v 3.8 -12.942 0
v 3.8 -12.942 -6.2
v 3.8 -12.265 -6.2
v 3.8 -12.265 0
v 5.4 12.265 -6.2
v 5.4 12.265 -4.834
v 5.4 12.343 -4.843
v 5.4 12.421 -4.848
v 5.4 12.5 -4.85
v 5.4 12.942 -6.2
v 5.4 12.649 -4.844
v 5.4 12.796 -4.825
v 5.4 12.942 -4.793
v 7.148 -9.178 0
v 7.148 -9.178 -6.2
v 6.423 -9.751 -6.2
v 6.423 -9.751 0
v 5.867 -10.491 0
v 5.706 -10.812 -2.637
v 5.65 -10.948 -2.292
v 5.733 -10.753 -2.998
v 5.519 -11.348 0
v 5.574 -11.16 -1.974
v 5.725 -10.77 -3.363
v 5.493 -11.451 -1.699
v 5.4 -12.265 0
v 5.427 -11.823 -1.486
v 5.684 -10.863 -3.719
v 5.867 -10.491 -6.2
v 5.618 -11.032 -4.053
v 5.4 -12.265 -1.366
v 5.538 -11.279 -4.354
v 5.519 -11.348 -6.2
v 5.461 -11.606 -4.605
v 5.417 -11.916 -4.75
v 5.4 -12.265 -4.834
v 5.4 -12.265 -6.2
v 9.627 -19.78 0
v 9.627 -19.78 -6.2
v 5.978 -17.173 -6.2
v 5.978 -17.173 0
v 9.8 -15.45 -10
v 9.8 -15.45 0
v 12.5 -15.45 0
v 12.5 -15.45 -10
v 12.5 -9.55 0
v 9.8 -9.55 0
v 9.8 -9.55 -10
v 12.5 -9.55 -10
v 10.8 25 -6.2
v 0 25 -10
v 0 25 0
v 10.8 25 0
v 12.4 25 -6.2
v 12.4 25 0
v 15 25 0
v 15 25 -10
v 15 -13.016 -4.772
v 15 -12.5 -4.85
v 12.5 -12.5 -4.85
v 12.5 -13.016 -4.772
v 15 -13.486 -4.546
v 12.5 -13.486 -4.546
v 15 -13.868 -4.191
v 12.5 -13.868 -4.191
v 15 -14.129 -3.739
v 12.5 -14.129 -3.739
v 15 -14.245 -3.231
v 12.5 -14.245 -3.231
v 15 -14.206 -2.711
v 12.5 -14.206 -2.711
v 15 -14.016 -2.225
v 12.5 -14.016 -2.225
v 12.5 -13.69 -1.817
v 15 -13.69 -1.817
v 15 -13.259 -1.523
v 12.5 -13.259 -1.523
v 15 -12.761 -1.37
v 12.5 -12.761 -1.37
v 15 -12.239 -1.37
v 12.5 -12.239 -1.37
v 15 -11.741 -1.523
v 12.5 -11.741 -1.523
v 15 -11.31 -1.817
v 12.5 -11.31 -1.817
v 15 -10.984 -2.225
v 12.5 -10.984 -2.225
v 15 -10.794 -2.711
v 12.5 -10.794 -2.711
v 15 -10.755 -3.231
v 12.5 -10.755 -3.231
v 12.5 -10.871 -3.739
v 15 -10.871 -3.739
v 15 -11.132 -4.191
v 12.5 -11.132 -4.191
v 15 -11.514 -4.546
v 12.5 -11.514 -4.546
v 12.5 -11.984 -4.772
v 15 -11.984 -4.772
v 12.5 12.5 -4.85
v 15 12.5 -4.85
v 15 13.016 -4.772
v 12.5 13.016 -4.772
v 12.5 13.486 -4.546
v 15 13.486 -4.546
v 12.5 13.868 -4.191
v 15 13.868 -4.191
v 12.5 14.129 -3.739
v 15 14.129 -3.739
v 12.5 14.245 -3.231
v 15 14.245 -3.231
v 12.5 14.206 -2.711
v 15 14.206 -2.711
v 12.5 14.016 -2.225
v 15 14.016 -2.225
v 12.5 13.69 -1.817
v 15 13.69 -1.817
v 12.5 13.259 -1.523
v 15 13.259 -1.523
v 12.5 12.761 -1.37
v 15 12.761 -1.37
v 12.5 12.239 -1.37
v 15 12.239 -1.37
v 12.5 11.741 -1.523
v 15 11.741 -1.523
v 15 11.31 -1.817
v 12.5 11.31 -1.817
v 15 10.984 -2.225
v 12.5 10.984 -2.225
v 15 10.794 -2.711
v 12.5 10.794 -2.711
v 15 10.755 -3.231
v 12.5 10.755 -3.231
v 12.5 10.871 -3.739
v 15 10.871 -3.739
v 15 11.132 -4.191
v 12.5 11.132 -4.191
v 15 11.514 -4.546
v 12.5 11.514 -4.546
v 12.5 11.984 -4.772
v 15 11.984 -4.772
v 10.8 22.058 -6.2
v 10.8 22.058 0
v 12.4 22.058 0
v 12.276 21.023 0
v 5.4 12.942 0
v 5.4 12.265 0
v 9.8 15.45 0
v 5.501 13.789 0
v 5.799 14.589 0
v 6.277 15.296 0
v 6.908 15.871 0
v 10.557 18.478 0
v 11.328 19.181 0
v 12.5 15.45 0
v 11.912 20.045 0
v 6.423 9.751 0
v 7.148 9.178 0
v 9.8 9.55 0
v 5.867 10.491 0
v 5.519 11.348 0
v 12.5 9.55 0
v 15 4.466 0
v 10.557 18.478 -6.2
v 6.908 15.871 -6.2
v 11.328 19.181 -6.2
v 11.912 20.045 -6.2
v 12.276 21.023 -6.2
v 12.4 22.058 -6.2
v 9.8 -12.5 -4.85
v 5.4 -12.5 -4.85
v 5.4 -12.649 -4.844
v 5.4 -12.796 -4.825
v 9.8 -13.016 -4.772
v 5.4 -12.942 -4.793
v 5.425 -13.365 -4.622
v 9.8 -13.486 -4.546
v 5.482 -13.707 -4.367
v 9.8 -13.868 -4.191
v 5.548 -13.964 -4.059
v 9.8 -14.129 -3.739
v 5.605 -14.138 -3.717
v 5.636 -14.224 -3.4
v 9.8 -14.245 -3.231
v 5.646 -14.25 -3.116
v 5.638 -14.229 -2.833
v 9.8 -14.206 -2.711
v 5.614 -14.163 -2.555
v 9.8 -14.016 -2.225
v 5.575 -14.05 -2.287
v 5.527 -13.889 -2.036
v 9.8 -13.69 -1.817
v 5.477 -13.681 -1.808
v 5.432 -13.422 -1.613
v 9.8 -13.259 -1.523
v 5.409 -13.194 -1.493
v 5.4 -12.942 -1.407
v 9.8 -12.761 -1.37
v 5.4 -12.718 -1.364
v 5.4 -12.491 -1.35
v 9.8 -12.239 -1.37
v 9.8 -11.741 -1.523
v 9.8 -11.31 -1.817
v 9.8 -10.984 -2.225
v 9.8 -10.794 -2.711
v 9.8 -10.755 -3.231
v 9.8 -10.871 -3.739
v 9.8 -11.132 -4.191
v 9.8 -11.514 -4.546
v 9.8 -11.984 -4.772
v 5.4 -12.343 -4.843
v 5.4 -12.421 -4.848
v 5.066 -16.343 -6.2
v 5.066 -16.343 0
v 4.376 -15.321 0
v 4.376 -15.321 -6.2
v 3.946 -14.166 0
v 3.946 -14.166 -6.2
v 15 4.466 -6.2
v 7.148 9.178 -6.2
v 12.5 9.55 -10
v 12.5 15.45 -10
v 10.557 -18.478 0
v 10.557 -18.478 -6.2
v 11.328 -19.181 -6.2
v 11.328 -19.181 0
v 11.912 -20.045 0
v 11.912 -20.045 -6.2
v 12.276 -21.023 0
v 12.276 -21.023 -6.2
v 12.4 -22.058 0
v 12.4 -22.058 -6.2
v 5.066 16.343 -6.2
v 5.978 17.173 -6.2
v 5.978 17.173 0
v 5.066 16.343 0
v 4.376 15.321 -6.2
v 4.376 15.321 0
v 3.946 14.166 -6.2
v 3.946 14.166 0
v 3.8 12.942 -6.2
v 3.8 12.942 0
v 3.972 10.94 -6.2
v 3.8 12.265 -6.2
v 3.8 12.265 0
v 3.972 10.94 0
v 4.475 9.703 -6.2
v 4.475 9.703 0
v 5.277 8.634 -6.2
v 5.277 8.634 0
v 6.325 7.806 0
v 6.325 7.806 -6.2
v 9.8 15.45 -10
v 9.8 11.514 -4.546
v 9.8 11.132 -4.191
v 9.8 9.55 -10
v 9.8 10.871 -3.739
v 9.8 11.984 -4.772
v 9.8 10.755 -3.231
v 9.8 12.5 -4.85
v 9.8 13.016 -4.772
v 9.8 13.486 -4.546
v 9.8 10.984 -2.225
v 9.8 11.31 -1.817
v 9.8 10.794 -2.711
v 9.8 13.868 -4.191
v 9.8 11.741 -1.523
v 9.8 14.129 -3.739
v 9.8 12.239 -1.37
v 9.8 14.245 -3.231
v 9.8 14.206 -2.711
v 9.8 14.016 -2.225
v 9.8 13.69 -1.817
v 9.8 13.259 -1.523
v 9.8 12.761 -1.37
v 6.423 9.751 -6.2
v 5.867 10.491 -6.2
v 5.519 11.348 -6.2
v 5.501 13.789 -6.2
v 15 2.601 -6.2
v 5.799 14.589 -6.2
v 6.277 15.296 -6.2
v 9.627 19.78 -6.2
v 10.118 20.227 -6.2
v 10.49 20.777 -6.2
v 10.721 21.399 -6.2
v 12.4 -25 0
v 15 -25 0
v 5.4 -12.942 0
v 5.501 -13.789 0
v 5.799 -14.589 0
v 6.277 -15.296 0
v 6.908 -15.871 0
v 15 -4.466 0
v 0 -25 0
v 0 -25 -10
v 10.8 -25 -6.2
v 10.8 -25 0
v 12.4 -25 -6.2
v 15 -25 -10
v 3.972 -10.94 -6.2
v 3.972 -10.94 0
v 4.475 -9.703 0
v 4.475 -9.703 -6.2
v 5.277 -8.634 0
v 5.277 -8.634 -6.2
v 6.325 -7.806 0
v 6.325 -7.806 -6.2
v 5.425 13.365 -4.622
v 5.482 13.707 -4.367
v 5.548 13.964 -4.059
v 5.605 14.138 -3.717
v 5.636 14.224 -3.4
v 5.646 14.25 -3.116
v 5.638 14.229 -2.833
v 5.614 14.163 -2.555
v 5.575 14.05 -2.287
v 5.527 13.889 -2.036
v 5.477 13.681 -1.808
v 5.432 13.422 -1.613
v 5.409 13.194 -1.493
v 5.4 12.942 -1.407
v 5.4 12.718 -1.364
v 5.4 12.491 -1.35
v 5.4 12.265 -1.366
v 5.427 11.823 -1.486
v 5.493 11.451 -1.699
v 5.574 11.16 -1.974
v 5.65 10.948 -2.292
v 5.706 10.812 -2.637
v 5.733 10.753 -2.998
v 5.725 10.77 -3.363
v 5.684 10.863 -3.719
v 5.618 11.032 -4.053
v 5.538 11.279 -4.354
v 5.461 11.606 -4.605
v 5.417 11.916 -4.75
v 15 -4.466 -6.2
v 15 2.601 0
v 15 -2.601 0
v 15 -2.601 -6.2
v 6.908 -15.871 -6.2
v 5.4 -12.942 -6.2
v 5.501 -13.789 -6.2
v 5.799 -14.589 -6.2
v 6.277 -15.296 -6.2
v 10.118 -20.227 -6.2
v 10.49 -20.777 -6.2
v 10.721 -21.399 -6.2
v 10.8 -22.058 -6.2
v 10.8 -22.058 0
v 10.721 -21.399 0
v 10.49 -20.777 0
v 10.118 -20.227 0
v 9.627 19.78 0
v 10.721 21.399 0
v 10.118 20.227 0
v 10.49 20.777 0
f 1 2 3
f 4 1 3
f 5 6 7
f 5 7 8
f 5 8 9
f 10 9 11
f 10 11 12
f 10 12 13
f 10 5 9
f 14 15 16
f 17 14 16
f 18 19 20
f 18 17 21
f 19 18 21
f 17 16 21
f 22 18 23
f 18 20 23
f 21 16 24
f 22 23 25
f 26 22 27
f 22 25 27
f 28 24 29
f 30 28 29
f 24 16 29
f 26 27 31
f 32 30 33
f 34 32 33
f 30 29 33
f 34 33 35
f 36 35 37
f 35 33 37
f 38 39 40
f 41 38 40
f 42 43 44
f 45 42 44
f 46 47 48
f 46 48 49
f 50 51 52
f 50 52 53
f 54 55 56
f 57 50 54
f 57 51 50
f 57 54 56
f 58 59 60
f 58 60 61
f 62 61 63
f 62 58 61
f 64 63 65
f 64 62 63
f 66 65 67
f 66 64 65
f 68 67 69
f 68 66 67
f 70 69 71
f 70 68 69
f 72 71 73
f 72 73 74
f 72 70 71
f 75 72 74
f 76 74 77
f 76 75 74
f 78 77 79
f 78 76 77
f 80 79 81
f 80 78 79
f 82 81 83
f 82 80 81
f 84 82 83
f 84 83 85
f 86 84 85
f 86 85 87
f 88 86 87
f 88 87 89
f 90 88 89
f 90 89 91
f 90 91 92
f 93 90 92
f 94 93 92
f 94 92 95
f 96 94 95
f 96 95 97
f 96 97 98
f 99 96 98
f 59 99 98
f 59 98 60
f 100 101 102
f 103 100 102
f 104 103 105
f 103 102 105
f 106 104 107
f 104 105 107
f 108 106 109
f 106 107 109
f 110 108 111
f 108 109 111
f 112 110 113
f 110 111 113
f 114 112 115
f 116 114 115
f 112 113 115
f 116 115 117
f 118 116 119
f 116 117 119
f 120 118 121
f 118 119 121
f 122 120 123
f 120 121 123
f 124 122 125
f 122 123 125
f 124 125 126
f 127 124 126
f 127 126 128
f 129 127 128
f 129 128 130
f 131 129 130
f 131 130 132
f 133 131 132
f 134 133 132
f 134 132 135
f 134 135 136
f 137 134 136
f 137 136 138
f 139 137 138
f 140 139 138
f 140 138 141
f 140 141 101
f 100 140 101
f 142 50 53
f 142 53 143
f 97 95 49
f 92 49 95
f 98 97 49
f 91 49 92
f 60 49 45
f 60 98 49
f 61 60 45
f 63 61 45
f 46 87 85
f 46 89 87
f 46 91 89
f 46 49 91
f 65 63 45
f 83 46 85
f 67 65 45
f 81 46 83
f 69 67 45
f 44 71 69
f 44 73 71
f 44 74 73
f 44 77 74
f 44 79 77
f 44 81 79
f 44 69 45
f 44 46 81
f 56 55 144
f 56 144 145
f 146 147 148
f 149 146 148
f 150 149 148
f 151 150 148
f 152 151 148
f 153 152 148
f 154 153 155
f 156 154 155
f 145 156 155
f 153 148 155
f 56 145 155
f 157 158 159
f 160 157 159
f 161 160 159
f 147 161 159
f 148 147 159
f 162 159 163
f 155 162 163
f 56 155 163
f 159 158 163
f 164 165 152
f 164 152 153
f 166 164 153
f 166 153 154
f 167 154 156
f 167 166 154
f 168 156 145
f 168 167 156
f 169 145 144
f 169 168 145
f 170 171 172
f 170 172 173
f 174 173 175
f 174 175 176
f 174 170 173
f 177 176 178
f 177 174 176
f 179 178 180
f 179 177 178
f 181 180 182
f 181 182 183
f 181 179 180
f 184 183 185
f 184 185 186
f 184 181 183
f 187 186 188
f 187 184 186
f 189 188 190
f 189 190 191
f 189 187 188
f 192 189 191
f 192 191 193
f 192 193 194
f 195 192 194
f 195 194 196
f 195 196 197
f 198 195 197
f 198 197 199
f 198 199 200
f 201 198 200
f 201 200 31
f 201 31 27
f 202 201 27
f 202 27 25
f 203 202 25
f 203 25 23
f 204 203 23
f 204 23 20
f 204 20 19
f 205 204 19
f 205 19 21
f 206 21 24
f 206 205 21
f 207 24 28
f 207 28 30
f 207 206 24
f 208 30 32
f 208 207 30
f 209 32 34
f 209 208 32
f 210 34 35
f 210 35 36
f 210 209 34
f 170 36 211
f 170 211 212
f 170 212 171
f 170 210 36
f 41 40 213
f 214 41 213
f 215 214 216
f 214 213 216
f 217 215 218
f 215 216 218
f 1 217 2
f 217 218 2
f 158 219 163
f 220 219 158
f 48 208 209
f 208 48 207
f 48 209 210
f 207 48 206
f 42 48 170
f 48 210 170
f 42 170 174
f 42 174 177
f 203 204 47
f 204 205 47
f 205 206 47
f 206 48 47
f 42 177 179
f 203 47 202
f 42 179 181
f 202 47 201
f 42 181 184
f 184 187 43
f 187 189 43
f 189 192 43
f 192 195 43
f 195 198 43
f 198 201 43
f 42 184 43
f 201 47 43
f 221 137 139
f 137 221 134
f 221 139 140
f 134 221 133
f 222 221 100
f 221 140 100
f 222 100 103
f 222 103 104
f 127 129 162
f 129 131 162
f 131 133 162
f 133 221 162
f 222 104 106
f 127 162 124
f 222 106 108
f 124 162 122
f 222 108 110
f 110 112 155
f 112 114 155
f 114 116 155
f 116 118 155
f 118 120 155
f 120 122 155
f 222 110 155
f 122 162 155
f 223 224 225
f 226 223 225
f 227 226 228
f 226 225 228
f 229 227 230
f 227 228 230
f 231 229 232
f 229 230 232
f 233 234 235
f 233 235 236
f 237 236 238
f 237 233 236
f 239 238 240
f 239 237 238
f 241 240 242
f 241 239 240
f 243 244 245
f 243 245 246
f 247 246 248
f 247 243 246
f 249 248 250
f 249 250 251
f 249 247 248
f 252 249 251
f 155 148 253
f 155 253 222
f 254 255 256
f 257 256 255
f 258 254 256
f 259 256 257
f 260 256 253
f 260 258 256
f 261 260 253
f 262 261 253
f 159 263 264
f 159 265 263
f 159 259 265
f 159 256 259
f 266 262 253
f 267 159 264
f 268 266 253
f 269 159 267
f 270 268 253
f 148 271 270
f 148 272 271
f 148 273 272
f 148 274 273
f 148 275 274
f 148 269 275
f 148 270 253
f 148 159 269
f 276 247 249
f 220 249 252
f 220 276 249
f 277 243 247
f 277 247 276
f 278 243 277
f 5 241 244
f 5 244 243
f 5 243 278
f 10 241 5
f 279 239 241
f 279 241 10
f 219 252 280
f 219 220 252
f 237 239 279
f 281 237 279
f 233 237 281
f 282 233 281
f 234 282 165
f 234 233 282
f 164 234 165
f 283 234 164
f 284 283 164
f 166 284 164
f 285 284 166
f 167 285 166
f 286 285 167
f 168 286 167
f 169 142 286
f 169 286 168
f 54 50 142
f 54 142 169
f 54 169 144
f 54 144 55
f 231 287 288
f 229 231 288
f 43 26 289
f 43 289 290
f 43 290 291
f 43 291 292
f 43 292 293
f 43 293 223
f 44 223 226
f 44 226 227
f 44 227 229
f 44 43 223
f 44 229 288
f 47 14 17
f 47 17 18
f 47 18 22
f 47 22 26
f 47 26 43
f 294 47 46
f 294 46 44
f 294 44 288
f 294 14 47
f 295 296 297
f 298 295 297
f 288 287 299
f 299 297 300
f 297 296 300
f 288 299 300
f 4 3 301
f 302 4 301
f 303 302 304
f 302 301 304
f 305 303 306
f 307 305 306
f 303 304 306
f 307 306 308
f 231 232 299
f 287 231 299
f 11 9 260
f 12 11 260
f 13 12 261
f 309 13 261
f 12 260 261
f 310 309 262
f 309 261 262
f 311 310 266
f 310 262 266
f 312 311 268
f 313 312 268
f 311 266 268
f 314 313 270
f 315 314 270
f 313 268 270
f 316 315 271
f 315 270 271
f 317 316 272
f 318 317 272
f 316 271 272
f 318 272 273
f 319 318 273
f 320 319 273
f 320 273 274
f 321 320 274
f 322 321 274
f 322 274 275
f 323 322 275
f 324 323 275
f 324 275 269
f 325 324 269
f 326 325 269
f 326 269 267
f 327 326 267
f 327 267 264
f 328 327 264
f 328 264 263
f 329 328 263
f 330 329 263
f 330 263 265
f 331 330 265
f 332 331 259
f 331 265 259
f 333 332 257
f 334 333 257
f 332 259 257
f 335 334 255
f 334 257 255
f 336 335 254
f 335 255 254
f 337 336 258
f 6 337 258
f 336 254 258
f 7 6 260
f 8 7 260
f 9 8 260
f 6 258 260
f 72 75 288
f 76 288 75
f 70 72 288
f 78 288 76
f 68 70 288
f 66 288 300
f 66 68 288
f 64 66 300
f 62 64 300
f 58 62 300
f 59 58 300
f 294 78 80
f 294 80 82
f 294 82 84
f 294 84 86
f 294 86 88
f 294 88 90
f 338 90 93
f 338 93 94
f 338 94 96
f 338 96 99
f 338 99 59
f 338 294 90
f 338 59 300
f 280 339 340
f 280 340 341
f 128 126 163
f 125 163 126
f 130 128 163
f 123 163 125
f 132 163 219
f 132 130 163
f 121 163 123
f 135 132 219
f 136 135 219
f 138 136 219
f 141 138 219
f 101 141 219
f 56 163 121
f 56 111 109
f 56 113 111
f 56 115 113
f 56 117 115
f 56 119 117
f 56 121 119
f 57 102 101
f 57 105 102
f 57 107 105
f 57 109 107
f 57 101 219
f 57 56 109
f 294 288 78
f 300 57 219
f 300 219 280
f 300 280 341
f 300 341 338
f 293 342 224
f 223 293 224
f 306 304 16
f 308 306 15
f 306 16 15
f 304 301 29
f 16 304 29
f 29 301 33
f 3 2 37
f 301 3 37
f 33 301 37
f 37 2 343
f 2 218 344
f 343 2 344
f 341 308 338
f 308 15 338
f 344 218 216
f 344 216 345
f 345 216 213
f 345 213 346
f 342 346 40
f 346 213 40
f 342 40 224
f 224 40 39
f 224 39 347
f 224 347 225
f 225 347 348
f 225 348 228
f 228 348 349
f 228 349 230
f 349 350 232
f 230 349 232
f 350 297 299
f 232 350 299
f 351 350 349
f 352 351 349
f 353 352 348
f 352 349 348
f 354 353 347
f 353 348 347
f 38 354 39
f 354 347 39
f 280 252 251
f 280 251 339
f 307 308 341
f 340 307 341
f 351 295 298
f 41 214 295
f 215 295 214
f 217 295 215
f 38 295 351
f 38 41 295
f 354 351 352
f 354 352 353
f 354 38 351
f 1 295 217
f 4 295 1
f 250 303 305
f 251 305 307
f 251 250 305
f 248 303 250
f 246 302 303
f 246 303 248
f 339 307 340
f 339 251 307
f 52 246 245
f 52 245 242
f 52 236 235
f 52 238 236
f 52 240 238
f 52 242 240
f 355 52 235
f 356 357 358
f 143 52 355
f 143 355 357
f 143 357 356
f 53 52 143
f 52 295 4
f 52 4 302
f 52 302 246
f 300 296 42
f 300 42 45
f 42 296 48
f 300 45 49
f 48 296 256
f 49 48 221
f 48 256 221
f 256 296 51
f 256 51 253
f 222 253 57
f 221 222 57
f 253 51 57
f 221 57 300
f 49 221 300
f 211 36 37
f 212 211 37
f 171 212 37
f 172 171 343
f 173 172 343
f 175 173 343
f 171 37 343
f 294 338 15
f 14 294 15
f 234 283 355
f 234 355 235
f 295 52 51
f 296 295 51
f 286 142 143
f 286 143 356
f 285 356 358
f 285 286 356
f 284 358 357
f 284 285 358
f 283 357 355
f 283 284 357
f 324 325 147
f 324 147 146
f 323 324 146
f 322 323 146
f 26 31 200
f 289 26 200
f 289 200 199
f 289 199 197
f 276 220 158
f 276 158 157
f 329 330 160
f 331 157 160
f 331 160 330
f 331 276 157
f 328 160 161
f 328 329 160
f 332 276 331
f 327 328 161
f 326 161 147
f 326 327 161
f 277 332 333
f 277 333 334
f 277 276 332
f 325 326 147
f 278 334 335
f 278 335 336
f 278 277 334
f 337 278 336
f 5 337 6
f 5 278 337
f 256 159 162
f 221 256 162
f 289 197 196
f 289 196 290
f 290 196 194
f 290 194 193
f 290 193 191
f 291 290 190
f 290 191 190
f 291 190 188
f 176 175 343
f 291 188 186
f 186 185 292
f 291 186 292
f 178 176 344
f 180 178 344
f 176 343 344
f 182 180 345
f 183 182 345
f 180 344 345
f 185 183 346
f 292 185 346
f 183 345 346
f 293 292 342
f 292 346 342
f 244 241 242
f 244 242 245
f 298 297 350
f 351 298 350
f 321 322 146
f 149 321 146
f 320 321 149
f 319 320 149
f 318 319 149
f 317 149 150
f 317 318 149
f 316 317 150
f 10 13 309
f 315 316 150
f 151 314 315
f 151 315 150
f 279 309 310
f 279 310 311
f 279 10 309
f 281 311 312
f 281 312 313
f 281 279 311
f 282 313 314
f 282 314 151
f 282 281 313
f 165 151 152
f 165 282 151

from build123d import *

# Parameters (mm, degrees)
ESQUISSE1_W                           = 15
ESQUISSE1_H                           = 10
BOSS_EXTRU_1_DEPTH                    = 25
ENL_VEMENT_START                      = -6.2
ENL_VEMENT_DE_MATI_RE_BALAYAGE1_DEPTH = 6.2
ENL_V_MAT_EXTRU_1_REACH               = 32.822
ESQUISSE4_R                           = 1.75
ENL_V_MAT_EXTRU_2_REACH               = 32.822
ESQUISSE5_W                           = 2.7
ESQUISSE5_H                           = 5.9


# Read off the part's stored shape, not the designer's step: Enlèvement de matière-Balayage1
with BuildPart() as part:
    # Esquisse1 → Boss.-Extru.1 (new body)
    with BuildSketch(Plane(origin=(0, 0, 0), x_dir=(1, 0, 0), z_dir=(0, 1, 0))):
        with Locations((7.5, 5)):
            Rectangle(ESQUISSE1_W, ESQUISSE1_H)
    extrude(amount=BOSS_EXTRU_1_DEPTH)

    # Enlèvement de matière-Balayage1 outline → Enlèvement de matière-Balayage1 (cut)
    with BuildSketch(Plane.XY.offset(ENL_VEMENT_START)):
        with BuildLine():
            Line((10.8, 25), (10.8, 22.058471581))
            ThreePointArc((10.8, 22.058471581), (10.4896694, 20.777243155), (9.627466942, 19.780017862))
            Line((9.627466942, 19.780017862), (5.977561393, 17.172942469))
            ThreePointArc((5.977561393, 17.172942469), (4.376328258, 15.320952639), (3.8, 12.941528419))
            Line((3.8, 12.941528419), (3.8, 12.264761516))
            ThreePointArc((3.8, 12.264761516), (4.474960485, 9.702727678), (6.324622072, 7.805798302))
            Line((6.324622072, 7.805798302), (15, 2.600571545))
            Line((15, 2.600571545), (15, 4.466476152))
            Line((15, 4.466476152), (7.14781528, 9.177786983))
            ThreePointArc((7.14781528, 9.177786983), (5.867280336, 10.491045782), (5.4, 12.264761516))
            Line((5.4, 12.264761516), (5.4, 12.941528419))
            ThreePointArc((5.4, 12.941528419), (5.798996486, 14.58882211), (6.907542503, 15.870968915))
            Line((6.907542503, 15.870968915), (10.557448052, 18.478044308))
            ThreePointArc((10.557448052, 18.478044308), (11.912337628, 20.045112625), (12.4, 22.058471581))
            Line((12.4, 22.058471581), (12.4, 25))
            Line((12.4, 25), (10.8, 25))
        make_face()
    extrude(amount=ENL_VEMENT_DE_MATI_RE_BALAYAGE1_DEPTH, mode=Mode.SUBTRACT)

    # Esquisse4 → Enlèv. mat.-Extru.1 (cut, up to next)
    with BuildSketch(Plane(origin=(15, 0, 0), x_dir=(0, 0, -1), z_dir=(1, 0, 0)), mode=Mode.PRIVATE) as enl_v_mat_extru_1_sk1:
        with Locations((3.1, 12.5)):
            Circle(ESQUISSE4_R)
    enl_v_mat_extru_1_tool1 = extrude(enl_v_mat_extru_1_sk1.sketch, amount=-ENL_V_MAT_EXTRU_1_REACH, mode=Mode.PRIVATE) & part.part
    add(enl_v_mat_extru_1_tool1.solids().sort_by_distance((15, 12.5, -3.1))[0], mode=Mode.SUBTRACT)

    # Esquisse5 → Enlèv. mat.-Extru.2 (cut, up to next)
    with BuildSketch(Plane.XY, mode=Mode.PRIVATE) as enl_v_mat_extru_2_sk1:
        with Locations((11.15, 12.5)):
            Rectangle(ESQUISSE5_W, ESQUISSE5_H)
    enl_v_mat_extru_2_tool1 = extrude(enl_v_mat_extru_2_sk1.sketch, amount=-ENL_V_MAT_EXTRU_2_REACH, mode=Mode.PRIVATE) & part.part
    add(enl_v_mat_extru_2_tool1.solids().sort_by_distance((11.15, 12.5, 0))[0], mode=Mode.SUBTRACT)

    # Symétrie1: part across plane


with BuildPart() as part_1:
    add(part.part)
    add(part.part.mirror(Plane(origin=(0, 0, 0), x_dir=(0, 0, 1), z_dir=(0, -1, 0))))


solid = part_1.part
